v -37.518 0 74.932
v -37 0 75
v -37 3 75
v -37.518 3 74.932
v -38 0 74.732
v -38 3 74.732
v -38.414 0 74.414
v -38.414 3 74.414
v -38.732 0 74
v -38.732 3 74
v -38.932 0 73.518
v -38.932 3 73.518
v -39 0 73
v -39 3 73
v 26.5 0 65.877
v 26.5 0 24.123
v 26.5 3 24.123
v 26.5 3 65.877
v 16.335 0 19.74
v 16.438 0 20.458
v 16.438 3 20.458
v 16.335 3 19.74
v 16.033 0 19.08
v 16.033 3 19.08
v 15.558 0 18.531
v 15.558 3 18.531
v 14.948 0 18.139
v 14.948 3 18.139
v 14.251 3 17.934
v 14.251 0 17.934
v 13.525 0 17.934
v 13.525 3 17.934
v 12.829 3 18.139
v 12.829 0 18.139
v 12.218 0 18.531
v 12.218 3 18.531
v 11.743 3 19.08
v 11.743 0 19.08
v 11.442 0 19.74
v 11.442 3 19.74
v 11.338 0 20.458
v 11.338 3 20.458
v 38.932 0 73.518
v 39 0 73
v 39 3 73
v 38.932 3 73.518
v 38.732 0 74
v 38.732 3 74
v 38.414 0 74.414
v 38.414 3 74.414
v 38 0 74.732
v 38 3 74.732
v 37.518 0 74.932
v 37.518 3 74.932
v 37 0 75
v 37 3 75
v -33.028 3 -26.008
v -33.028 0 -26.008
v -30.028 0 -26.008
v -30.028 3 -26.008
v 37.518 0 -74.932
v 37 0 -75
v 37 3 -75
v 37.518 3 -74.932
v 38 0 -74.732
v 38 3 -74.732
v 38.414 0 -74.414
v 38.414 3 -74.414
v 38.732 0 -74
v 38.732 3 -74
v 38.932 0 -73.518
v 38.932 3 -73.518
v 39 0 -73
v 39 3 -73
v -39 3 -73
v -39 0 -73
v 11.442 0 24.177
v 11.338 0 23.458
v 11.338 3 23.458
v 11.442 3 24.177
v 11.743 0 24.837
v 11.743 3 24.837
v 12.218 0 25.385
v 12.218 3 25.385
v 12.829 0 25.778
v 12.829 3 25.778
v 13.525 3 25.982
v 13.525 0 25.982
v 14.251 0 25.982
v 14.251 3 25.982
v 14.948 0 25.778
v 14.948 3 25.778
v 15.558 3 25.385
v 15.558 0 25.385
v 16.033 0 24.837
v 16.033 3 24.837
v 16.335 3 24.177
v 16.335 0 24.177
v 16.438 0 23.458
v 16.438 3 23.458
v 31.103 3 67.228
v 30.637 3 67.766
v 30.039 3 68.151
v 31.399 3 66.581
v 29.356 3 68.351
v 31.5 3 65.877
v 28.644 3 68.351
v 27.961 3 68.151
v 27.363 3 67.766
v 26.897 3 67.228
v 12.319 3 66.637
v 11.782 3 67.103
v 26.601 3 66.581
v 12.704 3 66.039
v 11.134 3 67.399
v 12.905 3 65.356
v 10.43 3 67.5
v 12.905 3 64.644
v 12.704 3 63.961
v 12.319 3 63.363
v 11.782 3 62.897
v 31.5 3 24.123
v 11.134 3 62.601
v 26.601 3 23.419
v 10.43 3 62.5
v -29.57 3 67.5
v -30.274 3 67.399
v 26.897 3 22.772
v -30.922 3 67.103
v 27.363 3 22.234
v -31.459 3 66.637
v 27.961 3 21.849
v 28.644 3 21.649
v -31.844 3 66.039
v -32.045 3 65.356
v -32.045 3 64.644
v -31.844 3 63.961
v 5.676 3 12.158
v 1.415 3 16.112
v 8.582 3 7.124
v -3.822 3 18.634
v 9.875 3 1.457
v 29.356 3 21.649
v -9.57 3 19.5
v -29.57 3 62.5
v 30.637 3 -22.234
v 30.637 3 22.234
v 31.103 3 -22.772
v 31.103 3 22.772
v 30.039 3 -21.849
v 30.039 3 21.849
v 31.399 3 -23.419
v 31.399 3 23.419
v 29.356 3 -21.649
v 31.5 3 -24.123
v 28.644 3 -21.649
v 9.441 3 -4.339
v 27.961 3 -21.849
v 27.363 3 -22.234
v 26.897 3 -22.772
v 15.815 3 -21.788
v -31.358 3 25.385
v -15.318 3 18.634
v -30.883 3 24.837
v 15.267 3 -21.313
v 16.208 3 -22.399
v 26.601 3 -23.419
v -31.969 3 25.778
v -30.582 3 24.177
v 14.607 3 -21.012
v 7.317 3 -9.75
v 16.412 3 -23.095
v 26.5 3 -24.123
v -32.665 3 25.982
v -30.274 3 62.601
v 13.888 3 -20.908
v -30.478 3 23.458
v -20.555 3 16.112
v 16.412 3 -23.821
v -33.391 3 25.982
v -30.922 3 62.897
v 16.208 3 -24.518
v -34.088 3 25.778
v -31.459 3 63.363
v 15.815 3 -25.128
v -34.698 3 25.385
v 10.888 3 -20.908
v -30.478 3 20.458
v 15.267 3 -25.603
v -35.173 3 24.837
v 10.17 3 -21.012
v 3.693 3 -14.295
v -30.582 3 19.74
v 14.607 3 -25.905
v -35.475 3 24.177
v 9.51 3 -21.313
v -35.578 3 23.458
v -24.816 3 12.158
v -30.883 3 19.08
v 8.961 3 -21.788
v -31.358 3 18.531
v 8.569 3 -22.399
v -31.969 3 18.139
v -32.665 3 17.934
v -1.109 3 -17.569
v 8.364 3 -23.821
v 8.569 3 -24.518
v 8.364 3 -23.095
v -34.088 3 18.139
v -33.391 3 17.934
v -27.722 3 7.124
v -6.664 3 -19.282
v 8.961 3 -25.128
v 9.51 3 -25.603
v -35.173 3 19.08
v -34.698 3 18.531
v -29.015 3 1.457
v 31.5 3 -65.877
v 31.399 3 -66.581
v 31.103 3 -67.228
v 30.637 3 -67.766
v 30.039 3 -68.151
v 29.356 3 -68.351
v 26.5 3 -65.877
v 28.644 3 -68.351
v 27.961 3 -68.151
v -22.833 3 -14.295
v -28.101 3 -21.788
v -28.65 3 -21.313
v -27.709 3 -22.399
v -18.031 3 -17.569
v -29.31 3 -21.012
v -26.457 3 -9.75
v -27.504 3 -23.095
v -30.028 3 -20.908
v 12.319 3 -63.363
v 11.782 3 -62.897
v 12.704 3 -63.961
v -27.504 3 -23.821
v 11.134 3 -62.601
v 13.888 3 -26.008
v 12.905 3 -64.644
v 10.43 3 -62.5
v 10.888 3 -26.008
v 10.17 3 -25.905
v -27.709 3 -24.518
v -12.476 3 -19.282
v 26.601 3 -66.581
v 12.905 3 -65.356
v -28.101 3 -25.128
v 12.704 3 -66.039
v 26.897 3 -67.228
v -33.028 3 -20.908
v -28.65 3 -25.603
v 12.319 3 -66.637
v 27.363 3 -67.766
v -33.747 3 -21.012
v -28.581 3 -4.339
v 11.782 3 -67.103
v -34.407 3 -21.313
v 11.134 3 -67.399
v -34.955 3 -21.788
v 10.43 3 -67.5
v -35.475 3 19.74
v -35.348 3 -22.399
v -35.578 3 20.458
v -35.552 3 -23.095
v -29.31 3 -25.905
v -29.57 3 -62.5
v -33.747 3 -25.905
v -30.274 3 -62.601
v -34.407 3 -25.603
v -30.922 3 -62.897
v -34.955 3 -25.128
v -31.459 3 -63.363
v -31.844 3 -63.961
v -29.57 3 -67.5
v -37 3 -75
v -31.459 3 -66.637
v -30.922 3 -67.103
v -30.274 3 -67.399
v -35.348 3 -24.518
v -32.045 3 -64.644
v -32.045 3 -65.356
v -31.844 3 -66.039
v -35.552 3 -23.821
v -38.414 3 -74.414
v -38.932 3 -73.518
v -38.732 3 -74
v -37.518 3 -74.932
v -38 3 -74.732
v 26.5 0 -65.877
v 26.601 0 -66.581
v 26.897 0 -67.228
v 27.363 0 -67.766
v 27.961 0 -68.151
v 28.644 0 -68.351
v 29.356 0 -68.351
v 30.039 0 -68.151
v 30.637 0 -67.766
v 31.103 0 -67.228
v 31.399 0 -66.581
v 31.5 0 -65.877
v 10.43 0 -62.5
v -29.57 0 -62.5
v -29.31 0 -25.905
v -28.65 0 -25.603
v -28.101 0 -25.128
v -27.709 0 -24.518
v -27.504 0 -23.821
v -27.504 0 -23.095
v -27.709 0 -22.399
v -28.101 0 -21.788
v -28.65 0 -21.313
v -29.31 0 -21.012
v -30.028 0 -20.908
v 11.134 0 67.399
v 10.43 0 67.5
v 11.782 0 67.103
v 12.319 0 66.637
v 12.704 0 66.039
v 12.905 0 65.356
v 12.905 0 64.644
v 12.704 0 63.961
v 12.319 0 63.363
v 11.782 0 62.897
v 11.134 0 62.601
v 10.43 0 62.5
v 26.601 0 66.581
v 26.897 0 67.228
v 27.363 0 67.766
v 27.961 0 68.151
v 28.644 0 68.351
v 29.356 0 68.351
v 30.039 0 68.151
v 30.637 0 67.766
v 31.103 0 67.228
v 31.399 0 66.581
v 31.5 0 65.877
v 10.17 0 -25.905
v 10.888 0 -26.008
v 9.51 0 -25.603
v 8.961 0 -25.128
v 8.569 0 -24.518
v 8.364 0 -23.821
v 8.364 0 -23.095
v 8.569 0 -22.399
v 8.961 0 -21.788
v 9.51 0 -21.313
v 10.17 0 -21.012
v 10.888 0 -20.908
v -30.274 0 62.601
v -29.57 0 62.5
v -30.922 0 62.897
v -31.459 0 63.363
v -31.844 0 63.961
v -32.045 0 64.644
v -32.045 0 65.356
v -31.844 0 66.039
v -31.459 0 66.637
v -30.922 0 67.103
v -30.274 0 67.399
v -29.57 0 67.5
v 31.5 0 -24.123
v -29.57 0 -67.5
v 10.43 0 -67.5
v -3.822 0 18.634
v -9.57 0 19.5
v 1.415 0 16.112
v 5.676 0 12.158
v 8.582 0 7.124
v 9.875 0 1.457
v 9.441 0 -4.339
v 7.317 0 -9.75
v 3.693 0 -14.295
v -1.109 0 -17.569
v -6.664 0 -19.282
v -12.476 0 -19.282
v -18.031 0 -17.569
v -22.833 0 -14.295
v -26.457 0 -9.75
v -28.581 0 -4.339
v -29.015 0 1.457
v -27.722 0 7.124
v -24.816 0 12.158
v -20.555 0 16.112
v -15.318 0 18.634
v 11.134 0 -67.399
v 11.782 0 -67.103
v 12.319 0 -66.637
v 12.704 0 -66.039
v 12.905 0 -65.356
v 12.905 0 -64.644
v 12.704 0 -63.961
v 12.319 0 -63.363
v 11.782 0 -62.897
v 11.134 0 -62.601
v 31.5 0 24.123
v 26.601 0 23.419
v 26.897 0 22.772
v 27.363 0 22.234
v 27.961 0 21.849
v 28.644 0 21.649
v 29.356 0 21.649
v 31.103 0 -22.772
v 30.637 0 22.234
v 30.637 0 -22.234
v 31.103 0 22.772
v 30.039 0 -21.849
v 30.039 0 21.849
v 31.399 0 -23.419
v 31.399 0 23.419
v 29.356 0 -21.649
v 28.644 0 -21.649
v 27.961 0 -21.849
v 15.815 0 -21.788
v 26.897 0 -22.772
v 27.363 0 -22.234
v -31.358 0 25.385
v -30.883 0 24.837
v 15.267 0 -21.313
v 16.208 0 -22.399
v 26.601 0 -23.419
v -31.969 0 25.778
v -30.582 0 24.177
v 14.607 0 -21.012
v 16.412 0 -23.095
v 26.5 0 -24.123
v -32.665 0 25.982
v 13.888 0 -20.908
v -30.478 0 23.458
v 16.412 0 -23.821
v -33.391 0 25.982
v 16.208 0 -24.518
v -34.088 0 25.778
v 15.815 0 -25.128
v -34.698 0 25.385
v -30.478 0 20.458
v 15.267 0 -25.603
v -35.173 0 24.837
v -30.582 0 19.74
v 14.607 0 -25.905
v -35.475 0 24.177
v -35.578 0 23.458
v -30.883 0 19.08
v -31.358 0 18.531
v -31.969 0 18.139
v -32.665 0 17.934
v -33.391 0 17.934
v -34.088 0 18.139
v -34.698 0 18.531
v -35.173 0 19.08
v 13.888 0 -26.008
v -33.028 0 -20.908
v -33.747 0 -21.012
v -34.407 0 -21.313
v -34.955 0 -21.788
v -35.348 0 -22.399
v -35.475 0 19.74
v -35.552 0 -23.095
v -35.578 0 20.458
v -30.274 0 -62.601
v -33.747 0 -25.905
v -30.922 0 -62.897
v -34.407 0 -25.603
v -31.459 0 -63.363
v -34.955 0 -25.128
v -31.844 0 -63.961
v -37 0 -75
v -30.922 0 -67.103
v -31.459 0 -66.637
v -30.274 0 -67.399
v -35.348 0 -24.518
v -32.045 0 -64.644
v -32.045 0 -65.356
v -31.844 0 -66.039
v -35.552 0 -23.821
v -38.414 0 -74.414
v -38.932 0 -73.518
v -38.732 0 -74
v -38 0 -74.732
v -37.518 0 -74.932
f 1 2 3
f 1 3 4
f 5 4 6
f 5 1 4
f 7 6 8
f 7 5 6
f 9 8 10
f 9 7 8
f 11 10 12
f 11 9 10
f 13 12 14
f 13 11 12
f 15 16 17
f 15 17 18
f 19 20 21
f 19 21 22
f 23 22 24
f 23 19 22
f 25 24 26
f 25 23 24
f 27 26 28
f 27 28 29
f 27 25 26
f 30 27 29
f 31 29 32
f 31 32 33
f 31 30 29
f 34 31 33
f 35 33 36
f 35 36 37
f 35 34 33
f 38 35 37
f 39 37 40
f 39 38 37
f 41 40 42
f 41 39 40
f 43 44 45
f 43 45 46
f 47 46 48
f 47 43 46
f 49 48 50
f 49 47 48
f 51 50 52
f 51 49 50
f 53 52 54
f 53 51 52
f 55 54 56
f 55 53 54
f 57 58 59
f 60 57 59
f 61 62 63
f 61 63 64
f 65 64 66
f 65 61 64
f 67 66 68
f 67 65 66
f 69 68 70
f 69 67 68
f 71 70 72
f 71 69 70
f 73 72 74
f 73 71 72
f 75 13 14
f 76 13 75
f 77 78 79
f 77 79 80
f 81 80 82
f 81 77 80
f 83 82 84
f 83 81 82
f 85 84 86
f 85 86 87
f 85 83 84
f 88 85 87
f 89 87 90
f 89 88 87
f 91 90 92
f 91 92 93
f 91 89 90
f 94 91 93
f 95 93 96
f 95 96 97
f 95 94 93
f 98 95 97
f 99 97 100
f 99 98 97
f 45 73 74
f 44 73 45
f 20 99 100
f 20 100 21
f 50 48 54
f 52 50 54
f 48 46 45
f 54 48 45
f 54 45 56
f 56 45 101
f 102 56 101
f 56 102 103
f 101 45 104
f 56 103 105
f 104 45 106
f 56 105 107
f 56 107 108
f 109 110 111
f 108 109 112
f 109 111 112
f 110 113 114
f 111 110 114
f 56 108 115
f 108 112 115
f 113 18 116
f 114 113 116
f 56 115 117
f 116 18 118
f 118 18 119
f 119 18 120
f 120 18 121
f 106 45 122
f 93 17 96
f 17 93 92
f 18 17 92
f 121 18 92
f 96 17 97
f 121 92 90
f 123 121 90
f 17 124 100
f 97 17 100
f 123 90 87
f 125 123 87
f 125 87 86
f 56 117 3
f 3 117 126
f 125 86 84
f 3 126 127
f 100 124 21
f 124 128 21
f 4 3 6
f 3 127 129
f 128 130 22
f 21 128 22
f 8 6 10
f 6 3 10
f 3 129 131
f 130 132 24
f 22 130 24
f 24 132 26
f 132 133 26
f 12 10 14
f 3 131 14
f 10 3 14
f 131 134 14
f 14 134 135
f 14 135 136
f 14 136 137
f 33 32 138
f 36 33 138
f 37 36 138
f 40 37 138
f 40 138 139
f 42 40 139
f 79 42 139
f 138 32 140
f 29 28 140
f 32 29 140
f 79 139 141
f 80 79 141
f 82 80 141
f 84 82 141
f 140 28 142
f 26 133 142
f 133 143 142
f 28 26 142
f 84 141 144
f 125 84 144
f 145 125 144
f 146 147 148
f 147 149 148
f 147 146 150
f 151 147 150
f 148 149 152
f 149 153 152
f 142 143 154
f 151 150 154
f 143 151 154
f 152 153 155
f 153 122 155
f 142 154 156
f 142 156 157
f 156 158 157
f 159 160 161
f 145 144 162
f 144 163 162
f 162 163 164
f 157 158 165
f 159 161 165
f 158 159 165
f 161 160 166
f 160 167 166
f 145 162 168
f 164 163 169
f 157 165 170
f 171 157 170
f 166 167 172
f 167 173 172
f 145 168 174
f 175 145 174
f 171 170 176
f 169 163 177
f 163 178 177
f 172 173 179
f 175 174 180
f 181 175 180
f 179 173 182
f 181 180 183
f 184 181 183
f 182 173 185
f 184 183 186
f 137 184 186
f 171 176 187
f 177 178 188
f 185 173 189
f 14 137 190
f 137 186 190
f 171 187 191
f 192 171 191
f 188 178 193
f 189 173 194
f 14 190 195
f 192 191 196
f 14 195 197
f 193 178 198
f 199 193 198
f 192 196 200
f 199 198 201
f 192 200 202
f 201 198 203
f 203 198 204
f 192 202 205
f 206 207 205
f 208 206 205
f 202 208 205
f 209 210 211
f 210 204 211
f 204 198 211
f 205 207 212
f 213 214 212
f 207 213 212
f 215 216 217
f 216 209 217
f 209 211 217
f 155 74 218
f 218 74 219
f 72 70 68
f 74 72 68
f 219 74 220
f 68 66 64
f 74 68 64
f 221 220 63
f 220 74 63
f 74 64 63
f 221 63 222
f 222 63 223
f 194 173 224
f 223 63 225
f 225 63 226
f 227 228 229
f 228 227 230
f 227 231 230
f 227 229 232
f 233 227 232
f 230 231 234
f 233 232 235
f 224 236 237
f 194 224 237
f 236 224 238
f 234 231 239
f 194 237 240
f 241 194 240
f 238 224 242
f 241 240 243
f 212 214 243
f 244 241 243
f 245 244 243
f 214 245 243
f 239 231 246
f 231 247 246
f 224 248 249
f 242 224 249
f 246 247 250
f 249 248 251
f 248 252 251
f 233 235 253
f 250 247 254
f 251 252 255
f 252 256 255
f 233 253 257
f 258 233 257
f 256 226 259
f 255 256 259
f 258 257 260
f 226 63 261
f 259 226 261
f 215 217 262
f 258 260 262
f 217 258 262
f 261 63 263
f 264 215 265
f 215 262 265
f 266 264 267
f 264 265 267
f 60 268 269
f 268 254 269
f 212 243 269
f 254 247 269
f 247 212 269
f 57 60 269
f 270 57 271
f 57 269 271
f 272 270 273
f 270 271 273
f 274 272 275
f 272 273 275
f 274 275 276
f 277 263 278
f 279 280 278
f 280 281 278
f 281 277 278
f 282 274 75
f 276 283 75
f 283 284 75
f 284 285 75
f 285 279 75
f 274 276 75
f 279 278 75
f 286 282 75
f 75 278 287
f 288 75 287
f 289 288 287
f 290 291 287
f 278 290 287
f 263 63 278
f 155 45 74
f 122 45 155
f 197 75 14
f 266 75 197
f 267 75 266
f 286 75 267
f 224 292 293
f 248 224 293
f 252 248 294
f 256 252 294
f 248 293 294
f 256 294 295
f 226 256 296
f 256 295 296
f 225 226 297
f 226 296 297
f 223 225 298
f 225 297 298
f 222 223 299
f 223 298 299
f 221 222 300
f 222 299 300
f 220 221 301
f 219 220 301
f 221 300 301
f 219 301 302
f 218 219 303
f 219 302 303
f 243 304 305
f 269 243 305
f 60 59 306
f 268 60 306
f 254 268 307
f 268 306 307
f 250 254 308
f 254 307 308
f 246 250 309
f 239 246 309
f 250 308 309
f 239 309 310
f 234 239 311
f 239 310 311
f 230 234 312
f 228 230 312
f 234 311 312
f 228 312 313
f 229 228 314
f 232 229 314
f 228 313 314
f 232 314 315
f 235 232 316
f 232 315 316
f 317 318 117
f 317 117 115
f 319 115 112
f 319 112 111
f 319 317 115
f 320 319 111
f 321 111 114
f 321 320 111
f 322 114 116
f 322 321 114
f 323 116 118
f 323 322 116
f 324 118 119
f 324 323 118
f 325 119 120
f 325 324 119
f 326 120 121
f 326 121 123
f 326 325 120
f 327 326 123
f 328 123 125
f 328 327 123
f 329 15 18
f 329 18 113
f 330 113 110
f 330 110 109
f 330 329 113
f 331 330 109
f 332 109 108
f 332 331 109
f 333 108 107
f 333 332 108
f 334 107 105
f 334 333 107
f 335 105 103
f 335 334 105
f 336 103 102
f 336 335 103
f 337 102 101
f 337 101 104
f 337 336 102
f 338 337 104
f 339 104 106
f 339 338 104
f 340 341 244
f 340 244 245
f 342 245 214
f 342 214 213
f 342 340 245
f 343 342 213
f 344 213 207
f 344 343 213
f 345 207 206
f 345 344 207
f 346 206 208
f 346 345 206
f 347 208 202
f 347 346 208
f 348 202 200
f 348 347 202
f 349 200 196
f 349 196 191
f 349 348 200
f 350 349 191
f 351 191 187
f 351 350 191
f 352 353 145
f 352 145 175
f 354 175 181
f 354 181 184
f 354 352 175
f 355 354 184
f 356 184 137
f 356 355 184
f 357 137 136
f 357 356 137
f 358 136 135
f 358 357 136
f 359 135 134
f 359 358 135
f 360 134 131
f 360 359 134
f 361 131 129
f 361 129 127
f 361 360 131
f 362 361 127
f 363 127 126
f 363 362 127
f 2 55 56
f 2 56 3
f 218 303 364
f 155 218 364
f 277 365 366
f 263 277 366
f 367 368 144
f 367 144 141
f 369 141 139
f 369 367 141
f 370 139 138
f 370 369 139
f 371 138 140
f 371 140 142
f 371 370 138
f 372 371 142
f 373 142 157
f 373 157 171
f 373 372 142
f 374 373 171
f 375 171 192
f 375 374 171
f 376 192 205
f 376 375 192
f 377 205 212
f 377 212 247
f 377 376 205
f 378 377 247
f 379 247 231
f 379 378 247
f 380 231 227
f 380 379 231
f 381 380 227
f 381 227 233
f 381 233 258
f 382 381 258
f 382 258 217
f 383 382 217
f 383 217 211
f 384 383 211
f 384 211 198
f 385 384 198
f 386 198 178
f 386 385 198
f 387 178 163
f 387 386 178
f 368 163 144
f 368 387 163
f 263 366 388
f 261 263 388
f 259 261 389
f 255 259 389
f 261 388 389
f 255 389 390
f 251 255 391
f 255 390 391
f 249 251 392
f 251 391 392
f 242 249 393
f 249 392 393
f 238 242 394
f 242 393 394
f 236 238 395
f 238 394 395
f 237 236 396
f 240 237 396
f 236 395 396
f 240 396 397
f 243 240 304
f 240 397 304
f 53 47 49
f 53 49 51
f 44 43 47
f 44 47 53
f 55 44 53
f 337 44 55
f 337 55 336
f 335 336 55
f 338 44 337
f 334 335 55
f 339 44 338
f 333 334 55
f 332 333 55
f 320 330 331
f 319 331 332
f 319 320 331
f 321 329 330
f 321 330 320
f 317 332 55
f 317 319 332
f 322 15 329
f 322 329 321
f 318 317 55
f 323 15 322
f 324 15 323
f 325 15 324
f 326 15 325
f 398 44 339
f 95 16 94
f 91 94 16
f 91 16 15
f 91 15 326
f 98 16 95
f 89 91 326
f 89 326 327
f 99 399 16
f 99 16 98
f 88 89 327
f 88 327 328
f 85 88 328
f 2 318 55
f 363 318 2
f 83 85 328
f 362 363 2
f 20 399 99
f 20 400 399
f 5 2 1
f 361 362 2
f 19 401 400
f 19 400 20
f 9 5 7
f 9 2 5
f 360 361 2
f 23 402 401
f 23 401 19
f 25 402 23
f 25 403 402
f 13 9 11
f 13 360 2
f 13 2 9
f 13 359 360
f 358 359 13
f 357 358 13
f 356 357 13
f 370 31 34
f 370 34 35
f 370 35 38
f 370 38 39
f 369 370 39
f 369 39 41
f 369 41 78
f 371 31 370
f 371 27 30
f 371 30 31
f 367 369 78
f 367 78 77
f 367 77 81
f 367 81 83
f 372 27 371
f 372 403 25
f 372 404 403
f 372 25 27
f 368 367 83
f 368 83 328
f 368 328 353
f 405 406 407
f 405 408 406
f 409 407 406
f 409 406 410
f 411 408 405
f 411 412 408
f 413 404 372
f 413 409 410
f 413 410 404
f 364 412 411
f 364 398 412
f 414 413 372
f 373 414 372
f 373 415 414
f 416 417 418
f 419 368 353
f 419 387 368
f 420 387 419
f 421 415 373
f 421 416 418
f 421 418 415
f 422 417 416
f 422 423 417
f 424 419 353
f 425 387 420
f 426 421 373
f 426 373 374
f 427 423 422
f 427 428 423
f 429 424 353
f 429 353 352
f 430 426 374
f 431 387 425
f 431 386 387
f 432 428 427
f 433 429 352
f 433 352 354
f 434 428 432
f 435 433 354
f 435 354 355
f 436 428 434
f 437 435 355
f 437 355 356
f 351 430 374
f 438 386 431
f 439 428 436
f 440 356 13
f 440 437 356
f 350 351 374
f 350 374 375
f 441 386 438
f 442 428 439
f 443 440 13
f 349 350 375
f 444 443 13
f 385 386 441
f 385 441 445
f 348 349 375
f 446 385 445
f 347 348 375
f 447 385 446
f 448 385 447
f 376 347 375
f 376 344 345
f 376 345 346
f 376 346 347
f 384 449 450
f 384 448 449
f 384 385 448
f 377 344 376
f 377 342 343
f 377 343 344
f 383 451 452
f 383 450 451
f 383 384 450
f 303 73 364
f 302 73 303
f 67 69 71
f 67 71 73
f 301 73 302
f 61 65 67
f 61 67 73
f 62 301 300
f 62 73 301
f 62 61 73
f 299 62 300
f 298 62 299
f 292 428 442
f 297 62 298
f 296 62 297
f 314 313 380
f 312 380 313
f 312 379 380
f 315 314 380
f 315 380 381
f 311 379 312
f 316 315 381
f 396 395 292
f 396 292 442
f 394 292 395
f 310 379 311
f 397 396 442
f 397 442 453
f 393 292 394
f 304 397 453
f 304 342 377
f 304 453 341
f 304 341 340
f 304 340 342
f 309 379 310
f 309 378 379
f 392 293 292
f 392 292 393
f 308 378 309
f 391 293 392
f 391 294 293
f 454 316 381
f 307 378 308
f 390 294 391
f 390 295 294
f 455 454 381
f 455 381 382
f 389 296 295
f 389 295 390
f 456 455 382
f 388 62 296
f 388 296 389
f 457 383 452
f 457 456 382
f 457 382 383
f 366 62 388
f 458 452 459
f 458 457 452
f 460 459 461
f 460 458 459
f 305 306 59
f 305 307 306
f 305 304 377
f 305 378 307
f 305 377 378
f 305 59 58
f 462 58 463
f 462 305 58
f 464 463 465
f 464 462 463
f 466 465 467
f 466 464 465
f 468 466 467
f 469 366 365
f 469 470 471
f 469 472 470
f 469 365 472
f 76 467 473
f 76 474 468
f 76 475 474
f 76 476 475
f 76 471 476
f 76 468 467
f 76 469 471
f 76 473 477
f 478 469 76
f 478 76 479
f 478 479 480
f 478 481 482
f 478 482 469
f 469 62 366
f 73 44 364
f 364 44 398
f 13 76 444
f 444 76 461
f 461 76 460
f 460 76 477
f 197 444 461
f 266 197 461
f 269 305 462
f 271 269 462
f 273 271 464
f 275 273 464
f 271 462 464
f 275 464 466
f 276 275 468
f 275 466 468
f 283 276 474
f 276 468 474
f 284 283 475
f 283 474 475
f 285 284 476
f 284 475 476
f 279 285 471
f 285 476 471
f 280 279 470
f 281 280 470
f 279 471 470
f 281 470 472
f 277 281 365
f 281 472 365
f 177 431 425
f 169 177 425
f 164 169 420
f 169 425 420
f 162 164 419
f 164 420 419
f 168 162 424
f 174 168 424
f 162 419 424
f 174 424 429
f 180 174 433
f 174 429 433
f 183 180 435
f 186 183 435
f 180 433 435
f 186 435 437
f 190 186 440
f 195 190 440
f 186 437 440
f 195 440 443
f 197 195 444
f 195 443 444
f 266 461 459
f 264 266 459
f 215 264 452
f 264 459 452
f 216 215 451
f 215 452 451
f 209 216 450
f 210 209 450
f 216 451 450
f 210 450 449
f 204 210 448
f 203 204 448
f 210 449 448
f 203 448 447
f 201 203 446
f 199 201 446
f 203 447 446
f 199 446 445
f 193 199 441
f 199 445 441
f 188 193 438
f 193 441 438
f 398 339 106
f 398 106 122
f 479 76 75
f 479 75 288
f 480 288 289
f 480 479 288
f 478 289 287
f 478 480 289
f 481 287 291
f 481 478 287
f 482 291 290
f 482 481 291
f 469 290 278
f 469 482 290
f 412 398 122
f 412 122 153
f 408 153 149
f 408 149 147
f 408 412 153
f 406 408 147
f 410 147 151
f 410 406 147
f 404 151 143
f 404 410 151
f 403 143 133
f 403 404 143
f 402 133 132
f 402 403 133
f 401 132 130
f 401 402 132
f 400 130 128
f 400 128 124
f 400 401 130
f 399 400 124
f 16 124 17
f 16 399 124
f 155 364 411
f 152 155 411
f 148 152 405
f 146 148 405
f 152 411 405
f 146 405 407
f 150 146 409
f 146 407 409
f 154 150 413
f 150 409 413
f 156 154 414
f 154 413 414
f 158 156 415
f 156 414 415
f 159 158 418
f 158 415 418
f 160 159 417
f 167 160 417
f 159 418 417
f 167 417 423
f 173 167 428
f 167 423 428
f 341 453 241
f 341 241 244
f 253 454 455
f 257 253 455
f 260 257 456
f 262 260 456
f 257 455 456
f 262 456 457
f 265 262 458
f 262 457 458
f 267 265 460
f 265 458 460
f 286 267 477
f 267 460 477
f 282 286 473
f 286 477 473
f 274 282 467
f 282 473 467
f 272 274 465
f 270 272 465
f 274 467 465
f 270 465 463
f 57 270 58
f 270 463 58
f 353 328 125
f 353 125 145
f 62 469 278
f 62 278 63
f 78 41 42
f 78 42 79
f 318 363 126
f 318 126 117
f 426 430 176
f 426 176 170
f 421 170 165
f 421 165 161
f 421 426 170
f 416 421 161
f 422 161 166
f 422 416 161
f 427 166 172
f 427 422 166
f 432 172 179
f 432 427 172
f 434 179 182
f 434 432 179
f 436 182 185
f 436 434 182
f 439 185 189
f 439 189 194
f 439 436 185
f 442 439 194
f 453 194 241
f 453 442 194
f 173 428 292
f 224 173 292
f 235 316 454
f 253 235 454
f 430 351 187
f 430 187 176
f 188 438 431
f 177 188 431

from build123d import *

# Parameters (mm, degrees)
SKETCH1_R           = 19.5
BOSS_EXTRUDE1_DEPTH = 3


with BuildPart() as part:
    # Sketch1 → Boss-Extrude1 (new body)
    with BuildSketch(Plane(origin=(0, 0, 0), x_dir=(1, 0, 0), z_dir=(0, 1, 0))):
        with BuildLine():
            Line((-37, 75), (37, 75))
            ThreePointArc((37, 75), (38.414213562, 74.414213562), (39, 73))
            Line((39, 73), (39, -73))
            ThreePointArc((39, -73), (38.414213562, -74.414213562), (37, -75))
            Line((37, -75), (-37, -75))
            ThreePointArc((-37, -75), (-38.414213562, -74.414213562), (-39, -73))
            Line((-39, -73), (-39, 73))
            ThreePointArc((-39, 73), (-38.414213562, 74.414213562), (-37, 75))
        make_face()
        with Locations(Location((-9.57, 0, 0), (0, 0, 270))):
            Circle(SKETCH1_R, mode=Mode.SUBTRACT)
        with BuildLine():
            Line((31.5, 65.876713653), (31.5, 24.123286347))
            ThreePointArc((31.5, 24.123286347), (29, 21.623286347), (26.5, 24.123286347))
            Line((26.5, 24.123286347), (26.5, 65.876713653))
            ThreePointArc((26.5, 65.876713653), (29, 68.376713653), (31.5, 65.876713653))
        make_face(mode=Mode.SUBTRACT)
        with BuildLine():
            Line((31.5, -65.876713653), (31.5, -24.123286347))
            ThreePointArc((31.5, -24.123286347), (29, -21.623286347), (26.5, -24.123286347))
            Line((26.5, -24.123286347), (26.5, -65.876713653))
            ThreePointArc((26.5, -65.876713653), (29, -68.376713653), (31.5, -65.876713653))
        make_face(mode=Mode.SUBTRACT)
        with BuildLine():
            Line((-29.57, 67.5), (10.43, 67.5))
            ThreePointArc((10.43, 67.5), (12.93, 65), (10.43, 62.5))
            Line((10.43, 62.5), (-29.57, 62.5))
            ThreePointArc((-29.57, 62.5), (-32.07, 65), (-29.57, 67.5))
        make_face(mode=Mode.SUBTRACT)
        with BuildLine():
            Line((-29.57, -67.5), (10.43, -67.5))
            ThreePointArc((10.43, -67.5), (12.93, -65), (10.43, -62.5))
            Line((10.43, -62.5), (-29.57, -62.5))
            ThreePointArc((-29.57, -62.5), (-32.07, -65), (-29.57, -67.5))
        make_face(mode=Mode.SUBTRACT)
        with BuildLine():
            Line((-33.028267466, 26.008267466), (-30.028267466, 26.008267466))
            ThreePointArc((-30.028267466, 26.008267466), (-27.478267466, 23.458267466), (-30.028267466, 20.908267466))
            Line((-30.028267466, 20.908267466), (-33.028267466, 20.908267466))
            ThreePointArc((-33.028267466, 20.908267466), (-35.578267466, 23.458267466), (-33.028267466, 26.008267466))
        make_face(mode=Mode.SUBTRACT)
        with BuildLine():
            Line((13.888267466, 26.008267466), (10.888267466, 26.008267466))
            ThreePointArc((10.888267466, 26.008267466), (8.338267466, 23.458267466), (10.888267466, 20.908267466))
            Line((10.888267466, 20.908267466), (13.888267466, 20.908267466))
            ThreePointArc((13.888267466, 20.908267466), (16.438267466, 23.458267466), (13.888267466, 26.008267466))
        make_face(mode=Mode.SUBTRACT)
        with BuildLine():
            Line((-35.578267466, -23.458267466), (-35.578267466, -20.458267466))
            ThreePointArc((-35.578267466, -20.458267466), (-33.028267466, -17.908267466), (-30.478267466, -20.458267466))
            Line((-30.478267466, -20.458267466), (-30.478267466, -23.458267466))
            ThreePointArc((-30.478267466, -23.458267466), (-33.028267466, -26.008267466), (-35.578267466, -23.458267466))
        make_face(mode=Mode.SUBTRACT)
        with BuildLine():
            Line((16.438267466, -23.458267466), (16.438267466, -20.458267466))
            ThreePointArc((16.438267466, -20.458267466), (13.888267466, -17.908267466), (11.338267466, -20.458267466))
            Line((11.338267466, -20.458267466), (11.338267466, -23.458267466))
            ThreePointArc((11.338267466, -23.458267466), (13.888267466, -26.008267466), (16.438267466, -23.458267466))
        make_face(mode=Mode.SUBTRACT)
    extrude(amount=BOSS_EXTRUDE1_DEPTH)


solid = part.part
